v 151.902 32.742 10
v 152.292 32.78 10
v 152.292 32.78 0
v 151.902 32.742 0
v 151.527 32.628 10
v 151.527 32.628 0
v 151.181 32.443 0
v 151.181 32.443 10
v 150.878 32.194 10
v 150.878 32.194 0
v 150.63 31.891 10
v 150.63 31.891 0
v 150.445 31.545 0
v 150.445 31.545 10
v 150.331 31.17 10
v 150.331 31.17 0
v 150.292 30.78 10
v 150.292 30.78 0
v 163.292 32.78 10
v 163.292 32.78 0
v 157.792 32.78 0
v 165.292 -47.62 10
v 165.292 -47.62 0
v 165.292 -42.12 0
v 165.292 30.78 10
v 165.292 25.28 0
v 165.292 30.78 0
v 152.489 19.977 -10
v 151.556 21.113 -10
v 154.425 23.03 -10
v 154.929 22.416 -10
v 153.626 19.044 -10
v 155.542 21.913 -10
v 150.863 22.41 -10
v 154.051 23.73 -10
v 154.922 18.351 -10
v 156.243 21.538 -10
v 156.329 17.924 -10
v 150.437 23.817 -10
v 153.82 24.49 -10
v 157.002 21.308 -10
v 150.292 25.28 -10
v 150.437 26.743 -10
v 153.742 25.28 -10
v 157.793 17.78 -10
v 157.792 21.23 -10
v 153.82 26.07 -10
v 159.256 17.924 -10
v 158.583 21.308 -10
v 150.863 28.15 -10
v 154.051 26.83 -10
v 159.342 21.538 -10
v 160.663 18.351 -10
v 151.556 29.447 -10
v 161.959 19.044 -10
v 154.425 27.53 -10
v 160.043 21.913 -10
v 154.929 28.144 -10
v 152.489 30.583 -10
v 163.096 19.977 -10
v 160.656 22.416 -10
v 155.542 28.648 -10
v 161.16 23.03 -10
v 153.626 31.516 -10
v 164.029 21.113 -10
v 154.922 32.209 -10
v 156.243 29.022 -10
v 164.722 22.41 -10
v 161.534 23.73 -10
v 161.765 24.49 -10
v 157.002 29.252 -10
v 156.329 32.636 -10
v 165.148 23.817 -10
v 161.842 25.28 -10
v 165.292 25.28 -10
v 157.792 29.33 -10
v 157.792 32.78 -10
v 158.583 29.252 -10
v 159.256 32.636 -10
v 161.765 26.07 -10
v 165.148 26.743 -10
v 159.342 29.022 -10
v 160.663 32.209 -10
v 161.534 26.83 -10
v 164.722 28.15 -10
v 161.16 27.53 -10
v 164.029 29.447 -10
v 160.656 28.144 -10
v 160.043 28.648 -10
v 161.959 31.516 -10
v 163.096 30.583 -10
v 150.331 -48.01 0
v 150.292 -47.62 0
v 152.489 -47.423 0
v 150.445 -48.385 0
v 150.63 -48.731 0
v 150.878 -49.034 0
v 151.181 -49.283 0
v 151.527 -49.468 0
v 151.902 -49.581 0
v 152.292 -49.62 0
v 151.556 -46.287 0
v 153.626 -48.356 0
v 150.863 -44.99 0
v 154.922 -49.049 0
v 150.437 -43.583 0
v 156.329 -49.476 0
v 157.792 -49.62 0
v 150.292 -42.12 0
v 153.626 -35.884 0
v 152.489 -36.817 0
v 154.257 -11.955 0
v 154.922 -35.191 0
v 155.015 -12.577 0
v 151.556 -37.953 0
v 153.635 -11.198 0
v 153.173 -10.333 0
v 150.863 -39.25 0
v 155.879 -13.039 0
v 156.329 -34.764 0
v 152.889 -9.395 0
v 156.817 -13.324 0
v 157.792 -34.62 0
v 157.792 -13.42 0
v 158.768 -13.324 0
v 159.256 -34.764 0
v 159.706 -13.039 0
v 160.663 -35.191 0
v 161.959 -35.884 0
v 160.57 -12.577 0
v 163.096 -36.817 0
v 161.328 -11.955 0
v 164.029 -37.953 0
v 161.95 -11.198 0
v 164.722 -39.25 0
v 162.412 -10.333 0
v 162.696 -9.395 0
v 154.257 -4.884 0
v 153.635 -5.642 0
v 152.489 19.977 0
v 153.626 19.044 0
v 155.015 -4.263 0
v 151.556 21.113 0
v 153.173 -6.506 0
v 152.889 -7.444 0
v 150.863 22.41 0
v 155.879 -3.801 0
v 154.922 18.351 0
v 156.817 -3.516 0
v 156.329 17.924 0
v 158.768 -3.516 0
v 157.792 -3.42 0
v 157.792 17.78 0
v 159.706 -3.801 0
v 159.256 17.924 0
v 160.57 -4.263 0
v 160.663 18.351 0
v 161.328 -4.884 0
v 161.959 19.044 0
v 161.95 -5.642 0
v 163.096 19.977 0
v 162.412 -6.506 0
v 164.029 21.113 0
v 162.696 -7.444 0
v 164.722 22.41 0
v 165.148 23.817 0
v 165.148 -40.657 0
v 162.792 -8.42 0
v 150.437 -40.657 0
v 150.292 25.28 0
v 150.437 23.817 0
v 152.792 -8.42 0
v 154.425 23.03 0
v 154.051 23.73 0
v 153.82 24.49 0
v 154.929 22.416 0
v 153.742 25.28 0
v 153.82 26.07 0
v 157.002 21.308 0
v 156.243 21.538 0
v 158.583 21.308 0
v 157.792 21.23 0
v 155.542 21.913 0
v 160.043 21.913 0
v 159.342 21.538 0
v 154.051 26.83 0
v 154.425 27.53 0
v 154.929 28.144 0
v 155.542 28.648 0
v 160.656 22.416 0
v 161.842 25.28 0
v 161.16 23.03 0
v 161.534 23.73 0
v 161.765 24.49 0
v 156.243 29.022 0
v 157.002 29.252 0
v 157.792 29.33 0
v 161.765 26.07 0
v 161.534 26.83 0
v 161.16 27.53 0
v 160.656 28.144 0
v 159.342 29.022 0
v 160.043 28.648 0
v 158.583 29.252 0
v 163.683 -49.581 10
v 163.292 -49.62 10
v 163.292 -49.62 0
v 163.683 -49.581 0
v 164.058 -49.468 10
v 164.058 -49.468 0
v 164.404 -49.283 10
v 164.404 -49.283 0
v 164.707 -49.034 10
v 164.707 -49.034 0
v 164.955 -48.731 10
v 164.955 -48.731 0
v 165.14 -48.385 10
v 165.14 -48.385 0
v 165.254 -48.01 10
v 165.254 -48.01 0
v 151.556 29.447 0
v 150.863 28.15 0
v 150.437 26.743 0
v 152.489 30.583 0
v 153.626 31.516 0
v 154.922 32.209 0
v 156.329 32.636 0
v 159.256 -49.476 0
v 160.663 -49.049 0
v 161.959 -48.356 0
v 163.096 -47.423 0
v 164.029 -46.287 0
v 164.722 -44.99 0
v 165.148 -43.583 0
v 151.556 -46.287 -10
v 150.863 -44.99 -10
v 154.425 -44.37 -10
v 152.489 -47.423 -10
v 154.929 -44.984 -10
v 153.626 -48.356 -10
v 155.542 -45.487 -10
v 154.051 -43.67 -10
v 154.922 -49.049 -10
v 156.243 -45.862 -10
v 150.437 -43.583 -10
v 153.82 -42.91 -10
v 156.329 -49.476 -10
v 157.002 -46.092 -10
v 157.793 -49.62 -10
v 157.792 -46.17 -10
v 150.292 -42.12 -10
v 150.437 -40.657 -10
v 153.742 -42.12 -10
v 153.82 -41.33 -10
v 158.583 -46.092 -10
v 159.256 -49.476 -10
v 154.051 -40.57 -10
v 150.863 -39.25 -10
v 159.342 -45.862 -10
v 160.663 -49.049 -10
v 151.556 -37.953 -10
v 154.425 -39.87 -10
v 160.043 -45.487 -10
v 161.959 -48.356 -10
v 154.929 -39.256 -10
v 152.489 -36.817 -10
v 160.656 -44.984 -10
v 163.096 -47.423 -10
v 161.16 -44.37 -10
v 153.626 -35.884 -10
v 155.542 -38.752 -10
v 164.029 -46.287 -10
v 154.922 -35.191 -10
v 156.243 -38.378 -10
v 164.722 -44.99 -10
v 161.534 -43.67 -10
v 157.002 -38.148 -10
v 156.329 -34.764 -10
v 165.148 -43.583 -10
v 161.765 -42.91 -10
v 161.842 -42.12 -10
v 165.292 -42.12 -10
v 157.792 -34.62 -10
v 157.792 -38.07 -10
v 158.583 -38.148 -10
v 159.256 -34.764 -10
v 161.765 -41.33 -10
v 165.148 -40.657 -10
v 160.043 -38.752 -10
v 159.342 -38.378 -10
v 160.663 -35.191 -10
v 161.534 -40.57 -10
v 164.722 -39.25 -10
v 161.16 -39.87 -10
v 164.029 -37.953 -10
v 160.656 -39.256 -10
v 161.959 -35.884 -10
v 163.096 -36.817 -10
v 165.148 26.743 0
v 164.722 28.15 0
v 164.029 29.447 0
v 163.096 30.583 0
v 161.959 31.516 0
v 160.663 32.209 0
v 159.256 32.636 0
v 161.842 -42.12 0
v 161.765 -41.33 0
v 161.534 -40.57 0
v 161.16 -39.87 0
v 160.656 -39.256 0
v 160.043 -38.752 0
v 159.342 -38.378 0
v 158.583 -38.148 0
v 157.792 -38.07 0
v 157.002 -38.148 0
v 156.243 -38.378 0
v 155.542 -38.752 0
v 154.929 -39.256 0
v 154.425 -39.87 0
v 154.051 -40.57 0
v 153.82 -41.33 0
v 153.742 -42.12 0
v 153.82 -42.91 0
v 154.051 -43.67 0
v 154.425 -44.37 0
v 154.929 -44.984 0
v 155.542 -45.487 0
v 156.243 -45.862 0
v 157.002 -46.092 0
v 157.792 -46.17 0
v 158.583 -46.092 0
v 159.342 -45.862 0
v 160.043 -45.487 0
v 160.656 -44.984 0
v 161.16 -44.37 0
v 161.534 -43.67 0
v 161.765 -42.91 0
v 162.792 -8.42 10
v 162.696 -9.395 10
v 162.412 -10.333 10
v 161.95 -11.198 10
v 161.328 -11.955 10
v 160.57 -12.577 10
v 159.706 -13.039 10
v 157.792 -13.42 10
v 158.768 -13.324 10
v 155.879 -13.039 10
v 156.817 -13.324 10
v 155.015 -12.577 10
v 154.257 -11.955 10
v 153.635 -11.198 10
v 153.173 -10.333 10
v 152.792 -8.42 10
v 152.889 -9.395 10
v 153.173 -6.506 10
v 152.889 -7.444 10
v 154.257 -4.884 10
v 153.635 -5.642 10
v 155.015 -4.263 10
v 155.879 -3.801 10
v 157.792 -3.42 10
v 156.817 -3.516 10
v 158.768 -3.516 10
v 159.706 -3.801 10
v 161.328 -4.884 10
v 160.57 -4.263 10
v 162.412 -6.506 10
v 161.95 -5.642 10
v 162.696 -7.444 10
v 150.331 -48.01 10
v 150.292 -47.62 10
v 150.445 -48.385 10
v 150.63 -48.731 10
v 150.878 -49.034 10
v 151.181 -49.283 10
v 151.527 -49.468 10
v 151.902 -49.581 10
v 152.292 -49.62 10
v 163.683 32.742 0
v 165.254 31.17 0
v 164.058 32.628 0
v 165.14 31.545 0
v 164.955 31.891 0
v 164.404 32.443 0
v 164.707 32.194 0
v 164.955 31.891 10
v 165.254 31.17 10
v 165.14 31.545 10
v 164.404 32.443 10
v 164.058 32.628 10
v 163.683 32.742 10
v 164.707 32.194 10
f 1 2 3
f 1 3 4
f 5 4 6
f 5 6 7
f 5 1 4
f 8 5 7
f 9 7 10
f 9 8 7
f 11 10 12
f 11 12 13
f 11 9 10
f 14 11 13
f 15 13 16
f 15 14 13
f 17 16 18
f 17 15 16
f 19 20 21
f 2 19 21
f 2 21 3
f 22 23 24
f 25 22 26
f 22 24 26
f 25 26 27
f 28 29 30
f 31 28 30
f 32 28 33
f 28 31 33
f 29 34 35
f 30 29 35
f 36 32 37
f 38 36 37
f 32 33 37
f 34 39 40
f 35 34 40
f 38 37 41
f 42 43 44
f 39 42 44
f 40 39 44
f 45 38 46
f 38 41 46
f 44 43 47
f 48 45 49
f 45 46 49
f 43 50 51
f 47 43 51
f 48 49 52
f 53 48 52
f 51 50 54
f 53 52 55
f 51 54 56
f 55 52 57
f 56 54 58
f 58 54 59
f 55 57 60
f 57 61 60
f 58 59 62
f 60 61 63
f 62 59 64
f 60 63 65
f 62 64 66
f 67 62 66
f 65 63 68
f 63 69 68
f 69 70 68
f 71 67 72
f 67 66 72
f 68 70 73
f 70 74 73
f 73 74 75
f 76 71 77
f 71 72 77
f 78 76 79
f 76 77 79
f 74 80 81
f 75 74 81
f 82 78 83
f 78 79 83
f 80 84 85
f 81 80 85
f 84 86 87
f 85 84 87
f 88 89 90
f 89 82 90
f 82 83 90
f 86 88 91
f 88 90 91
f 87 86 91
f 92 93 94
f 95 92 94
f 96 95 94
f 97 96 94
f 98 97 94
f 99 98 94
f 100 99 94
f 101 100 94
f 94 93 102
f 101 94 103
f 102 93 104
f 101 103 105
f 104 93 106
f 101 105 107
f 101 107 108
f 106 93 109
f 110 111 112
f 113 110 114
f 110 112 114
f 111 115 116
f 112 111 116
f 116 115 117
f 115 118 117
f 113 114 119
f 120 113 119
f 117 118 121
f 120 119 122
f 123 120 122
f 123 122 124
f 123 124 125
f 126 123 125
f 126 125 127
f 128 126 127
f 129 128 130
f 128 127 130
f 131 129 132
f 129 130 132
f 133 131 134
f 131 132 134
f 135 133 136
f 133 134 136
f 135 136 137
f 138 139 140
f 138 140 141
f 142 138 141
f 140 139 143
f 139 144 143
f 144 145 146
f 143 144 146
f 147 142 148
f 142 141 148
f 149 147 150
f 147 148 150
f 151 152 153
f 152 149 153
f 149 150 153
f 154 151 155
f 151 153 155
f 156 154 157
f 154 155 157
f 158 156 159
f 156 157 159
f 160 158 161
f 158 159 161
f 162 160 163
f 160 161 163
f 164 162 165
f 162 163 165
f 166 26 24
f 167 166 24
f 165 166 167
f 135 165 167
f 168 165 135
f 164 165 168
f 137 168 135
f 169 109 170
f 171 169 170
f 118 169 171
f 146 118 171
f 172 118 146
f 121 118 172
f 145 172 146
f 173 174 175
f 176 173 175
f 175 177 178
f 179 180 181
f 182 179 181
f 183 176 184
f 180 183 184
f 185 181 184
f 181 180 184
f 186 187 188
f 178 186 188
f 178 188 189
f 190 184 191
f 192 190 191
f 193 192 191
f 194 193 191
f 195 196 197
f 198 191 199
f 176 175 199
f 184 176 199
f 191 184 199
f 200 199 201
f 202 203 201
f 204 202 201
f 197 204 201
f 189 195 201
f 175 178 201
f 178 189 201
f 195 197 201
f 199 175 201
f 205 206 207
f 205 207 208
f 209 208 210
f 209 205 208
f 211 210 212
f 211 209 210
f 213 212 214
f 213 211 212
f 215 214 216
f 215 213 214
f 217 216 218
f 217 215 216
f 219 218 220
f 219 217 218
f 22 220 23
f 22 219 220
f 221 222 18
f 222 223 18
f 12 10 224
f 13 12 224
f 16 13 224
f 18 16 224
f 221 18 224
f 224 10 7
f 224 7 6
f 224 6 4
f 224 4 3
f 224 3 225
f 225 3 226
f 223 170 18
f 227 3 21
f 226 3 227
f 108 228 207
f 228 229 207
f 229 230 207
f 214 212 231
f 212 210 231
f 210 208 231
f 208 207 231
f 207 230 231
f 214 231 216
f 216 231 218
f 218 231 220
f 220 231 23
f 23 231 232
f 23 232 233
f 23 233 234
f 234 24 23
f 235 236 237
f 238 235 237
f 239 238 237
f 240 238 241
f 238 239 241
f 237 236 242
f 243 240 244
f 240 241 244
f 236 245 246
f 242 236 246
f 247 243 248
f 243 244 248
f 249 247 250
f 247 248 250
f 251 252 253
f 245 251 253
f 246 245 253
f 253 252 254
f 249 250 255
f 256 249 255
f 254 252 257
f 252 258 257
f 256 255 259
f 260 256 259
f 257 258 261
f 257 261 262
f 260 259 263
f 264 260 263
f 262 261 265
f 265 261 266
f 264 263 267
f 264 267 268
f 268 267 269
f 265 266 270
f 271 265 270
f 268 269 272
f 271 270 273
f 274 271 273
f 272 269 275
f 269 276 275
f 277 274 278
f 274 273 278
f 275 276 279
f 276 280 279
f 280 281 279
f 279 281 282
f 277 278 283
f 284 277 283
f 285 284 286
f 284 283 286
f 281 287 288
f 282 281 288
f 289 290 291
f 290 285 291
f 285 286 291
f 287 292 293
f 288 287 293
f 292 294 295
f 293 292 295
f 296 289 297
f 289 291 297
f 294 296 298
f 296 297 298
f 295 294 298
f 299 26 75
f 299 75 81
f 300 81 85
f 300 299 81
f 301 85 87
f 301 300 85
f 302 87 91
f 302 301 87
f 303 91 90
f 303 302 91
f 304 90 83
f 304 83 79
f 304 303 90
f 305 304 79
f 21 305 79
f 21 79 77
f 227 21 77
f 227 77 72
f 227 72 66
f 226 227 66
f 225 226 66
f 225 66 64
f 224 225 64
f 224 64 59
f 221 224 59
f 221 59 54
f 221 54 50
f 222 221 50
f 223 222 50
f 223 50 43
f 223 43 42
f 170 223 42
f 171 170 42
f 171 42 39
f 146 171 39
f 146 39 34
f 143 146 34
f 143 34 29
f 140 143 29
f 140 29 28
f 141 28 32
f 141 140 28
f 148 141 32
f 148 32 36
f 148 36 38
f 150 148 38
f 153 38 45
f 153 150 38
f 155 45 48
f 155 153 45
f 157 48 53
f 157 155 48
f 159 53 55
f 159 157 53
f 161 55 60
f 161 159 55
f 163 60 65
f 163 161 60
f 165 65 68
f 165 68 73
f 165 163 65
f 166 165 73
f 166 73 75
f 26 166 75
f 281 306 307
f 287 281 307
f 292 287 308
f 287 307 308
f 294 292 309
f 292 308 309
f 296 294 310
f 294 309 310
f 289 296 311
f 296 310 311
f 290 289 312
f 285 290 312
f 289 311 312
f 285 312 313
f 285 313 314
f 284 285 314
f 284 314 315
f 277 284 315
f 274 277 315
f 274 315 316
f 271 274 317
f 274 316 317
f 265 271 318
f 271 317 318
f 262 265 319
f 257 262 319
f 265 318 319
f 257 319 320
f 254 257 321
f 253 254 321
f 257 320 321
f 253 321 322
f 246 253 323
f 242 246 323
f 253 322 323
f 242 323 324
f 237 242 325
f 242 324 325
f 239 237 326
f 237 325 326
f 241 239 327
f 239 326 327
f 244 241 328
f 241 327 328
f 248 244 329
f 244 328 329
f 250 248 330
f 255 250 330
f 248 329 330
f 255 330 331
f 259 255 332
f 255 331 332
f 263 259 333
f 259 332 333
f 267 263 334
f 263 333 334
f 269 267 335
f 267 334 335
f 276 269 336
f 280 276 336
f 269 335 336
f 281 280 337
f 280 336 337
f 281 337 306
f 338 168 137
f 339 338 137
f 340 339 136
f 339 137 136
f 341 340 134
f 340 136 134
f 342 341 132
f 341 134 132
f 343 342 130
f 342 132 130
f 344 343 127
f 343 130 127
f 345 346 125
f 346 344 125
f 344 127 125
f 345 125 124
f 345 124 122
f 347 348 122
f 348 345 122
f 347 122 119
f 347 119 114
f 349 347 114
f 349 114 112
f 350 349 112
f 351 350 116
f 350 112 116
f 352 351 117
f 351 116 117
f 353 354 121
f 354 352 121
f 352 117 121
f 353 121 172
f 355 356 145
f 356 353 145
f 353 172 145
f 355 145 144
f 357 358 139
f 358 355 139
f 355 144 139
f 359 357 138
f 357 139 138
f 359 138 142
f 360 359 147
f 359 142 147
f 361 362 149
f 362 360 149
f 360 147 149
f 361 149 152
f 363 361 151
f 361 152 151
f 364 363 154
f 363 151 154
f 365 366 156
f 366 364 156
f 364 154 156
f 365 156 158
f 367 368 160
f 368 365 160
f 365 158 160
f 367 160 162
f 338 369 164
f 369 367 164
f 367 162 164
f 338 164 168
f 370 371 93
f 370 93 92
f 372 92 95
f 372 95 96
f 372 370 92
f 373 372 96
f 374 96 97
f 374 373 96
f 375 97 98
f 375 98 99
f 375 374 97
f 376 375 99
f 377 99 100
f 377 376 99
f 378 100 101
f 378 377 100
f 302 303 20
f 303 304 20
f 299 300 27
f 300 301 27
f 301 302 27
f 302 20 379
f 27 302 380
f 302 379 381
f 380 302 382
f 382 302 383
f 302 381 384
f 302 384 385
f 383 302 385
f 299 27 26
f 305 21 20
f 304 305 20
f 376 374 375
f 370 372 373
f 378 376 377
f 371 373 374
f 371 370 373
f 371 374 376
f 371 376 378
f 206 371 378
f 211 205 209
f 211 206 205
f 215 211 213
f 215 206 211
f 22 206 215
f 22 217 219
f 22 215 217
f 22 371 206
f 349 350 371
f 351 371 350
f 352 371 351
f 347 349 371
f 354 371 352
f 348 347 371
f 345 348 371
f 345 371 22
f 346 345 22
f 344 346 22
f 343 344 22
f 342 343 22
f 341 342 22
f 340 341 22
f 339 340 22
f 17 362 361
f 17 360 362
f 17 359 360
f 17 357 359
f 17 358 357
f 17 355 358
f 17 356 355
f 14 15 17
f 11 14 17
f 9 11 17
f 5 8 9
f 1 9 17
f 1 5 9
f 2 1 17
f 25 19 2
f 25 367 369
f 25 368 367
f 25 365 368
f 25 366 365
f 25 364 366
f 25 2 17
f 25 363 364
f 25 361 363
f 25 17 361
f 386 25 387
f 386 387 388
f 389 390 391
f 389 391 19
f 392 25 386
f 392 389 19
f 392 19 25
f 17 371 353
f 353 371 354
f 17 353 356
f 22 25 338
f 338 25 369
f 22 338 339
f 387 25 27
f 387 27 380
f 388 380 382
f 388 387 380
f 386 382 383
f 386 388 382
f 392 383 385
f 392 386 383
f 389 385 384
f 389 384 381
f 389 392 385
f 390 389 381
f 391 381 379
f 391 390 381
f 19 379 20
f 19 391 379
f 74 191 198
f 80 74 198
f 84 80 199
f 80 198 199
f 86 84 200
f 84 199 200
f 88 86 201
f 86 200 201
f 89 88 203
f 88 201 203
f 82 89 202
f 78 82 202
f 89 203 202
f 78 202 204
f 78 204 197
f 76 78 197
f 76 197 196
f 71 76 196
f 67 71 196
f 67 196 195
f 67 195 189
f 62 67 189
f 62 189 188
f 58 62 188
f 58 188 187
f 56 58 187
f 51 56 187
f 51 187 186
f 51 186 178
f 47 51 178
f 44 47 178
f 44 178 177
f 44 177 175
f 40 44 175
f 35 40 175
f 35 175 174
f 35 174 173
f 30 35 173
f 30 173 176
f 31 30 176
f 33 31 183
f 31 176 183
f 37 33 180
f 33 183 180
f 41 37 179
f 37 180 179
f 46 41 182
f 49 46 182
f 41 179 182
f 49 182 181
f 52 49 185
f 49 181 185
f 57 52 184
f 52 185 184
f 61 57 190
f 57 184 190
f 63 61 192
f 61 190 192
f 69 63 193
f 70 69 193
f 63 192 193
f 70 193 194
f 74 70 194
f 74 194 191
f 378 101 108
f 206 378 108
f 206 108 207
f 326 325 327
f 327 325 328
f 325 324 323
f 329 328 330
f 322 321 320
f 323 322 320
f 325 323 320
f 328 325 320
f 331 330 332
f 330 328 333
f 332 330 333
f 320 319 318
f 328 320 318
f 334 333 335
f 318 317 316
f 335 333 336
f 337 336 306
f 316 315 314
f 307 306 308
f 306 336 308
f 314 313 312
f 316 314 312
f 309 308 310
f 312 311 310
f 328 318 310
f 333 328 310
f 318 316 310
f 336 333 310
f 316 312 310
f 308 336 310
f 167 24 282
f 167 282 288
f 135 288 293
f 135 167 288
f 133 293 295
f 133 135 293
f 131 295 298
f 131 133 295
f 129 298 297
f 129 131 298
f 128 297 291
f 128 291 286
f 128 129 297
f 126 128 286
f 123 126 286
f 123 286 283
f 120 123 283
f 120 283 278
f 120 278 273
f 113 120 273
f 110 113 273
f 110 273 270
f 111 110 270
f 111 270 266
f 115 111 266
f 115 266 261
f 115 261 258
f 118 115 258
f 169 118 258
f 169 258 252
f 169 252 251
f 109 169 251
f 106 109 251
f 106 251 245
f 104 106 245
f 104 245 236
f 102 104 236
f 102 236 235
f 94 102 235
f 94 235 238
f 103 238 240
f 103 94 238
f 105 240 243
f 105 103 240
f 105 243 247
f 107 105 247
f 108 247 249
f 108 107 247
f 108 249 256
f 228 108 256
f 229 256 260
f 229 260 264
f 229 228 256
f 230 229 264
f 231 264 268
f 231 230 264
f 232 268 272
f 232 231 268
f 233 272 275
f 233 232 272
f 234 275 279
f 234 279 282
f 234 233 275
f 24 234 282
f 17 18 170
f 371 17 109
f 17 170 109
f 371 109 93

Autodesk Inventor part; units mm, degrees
ref_plane "YZ Plane" through (0, 0, 0) normal (1, 0, 0) x (0, 1, 0)
ref_plane "XZ Plane" through (0, 0, 0) normal (0, 1, 0) x (-1, 0, 0)
ref_plane "XY Plane" through (0, 0, 0) normal (0, 0, 1) x (1, 0, 0)
sketch "Sketch1" plane through (0, 0, 0) normal (0, 0, 1) x (1, 0, 0)
  circle A0 centre (157.7925, 25.2801) radius 7.5 projected
  circle A1 centre (157.7925, 25.2801) radius 4.05 projected
  circle A2 centre (157.7925, -42.1199) radius 7.5 projected
  circle A3 centre (157.7925, -42.1199) radius 4.05 projected
  line L0 (7.5, 7.5) -> (-7.5, 7.5)
  line L1 (-7.5, 7.5) -> (-7.5, -74.9)
  line L2 (-7.5, -74.9) -> (7.5, -74.9)
  line L3 (7.5, -74.9) -> (7.5, 7.5)
  line L4 (7.5, 7.5) -> (-7.5, 7.5)
  line L5 (-7.5, 7.5) -> (-7.5, -74.9)
  line L6 (-7.5, -74.9) -> (7.5, -74.9)
  line L7 (7.5, -74.9) -> (7.5, 7.5)
  circle A4 centre (157.7925, 25.2801) radius 4.05 projected
  circle A5 centre (157.7925, 25.2801) radius 7.5 projected
  circle A6 centre (157.7925, 25.2801) radius 4.05 projected
  circle A7 centre (157.7925, -42.1199) radius 4.05 projected
  circle A8 centre (157.7925, -42.1199) radius 7.5 projected
  circle A9 centre (157.7925, -42.1199) radius 4.05 projected
  line L8 (7.5, 7.5) -> (-7.5, 7.5)
  line L9 (-7.5, 7.5) -> (-7.5, -74.9)
  line L10 (-7.5, -74.9) -> (7.5, -74.9)
  line L11 (7.5, -74.9) -> (7.5, 7.5)
  point P0 (0, 0)
extrude "Extrusion1" add sketch "Sketch1" against normal blind 10 contours A0 | A2
sketch "Sketch2" plane through (157.7925, 25.2801, 0) normal (0, 0, 1) x (1, 0, 0)
  line L0 (7.5, 7.5) -> (-7.5, 7.5)
  line L1 (-7.5, 7.5) -> (-7.5, -74.9)
  line L2 (-7.5, -74.9) -> (7.5, -74.9)
  line L3 (7.5, -74.9) -> (7.5, 7.5)
  circle A0 centre (0, 0) radius 7.5 projected
  circle A1 centre (0, 0) radius 4.05 projected
  circle A2 centre (0, -67.4) radius 7.5 projected
  circle A3 centre (0, -67.4) radius 4.05 projected
  circle A4 centre (0, -33.7) radius 7.5
  circle A5 centre (0, -33.7) radius 5
  point P0 (-157.7925, -25.2801)
  point P1 (7.5, 0)
  point P2 (-7.5, 0)
  point P3 (-7.5, -67.4)
  point P4 (7.5, -67.4)
  dimension "d2" = 10
extrude "Extrusion2" add sketch "Sketch2" along normal blind 10 contours L3 A0 L0 | A0 L1 L0 | A0 | L3 A4 L1 A0 | A4 | L3 A2 L1 A4 | A2 | L3 L2 A2 | A2 L2 L1 | A1 | A3
fillet "Fillet1" radius 2 4 edges at (150.2925, -49.6199, 5) (165.2925, -49.6199, 5) (165.2925, 32.7801, 5) (150.2925, 32.7801, 5)
properties part number "constraining plate"
